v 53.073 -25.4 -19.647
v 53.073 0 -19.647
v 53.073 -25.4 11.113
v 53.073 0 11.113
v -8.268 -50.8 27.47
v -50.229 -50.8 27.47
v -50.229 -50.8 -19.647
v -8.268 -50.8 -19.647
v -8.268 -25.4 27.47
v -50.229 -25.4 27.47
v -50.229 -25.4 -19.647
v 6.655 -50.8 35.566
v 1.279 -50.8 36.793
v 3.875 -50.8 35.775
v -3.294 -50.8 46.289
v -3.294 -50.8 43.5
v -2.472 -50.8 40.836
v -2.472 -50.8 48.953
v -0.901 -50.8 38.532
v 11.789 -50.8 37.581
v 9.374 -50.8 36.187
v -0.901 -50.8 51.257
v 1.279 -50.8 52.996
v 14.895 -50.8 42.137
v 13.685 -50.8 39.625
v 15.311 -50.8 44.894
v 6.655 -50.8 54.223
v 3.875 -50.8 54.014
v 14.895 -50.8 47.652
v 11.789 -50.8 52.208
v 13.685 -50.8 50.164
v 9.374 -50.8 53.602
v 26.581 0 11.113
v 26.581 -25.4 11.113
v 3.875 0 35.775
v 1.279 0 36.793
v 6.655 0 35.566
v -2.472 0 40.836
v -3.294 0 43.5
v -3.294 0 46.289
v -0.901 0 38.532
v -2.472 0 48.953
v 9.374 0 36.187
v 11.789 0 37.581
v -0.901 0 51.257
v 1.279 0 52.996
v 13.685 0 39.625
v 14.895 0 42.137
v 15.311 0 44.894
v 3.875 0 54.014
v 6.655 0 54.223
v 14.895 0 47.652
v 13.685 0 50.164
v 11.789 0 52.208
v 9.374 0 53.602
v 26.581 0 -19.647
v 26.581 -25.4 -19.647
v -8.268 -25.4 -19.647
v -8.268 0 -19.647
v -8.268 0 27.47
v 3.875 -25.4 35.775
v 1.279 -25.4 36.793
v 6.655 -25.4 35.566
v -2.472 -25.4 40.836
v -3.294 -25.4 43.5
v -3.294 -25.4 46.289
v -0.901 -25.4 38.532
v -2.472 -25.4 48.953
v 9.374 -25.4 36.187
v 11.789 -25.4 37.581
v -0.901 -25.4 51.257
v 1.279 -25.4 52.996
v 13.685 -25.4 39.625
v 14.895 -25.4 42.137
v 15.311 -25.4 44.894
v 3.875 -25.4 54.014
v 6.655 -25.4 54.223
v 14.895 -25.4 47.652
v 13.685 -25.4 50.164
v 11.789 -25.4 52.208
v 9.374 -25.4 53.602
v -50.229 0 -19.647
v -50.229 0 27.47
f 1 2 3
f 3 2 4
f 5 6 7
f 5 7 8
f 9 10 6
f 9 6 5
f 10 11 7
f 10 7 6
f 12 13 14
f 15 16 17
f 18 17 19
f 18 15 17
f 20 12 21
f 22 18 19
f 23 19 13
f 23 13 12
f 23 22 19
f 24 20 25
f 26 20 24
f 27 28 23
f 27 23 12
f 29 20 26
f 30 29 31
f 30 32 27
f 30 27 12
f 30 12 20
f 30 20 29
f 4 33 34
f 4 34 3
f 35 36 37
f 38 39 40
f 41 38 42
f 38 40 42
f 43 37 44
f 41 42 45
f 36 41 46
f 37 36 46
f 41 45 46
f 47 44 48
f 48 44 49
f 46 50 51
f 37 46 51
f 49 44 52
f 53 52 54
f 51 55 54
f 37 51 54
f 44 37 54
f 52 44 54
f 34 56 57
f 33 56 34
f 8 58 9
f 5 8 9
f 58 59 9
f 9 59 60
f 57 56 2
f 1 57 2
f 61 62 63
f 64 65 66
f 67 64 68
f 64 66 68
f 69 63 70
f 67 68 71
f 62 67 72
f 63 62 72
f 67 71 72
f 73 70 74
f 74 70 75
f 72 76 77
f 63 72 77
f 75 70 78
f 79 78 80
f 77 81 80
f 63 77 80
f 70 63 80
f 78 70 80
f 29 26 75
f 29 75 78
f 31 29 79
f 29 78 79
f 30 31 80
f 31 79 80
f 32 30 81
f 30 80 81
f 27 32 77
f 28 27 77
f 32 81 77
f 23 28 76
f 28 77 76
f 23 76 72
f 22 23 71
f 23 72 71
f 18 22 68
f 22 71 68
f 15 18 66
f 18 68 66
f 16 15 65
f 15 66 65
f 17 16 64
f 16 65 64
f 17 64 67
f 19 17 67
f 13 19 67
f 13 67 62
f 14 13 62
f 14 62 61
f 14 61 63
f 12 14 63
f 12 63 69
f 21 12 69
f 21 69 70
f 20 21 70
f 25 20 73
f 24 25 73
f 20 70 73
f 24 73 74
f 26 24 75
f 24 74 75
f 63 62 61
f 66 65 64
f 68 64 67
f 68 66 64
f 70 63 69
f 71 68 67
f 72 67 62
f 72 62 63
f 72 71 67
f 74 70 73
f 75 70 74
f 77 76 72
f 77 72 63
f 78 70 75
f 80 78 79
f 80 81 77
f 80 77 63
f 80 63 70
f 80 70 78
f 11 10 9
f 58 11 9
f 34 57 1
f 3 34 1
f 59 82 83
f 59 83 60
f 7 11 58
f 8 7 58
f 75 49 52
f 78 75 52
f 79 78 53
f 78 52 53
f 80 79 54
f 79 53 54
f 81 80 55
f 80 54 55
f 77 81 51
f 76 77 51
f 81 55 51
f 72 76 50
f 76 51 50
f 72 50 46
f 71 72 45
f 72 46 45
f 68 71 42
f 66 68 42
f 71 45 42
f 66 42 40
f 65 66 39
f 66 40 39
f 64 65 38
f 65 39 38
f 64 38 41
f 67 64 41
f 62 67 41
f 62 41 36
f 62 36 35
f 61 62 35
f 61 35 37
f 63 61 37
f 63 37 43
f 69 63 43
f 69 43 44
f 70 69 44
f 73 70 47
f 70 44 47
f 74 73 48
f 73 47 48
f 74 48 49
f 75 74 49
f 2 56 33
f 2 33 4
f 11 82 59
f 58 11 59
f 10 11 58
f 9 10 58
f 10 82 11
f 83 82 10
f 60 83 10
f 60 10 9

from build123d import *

# Parameters (mm, degrees)
F0_W      = 26.492203
F0_H      = 30.759401
F0_W_2    = 41.960802
F0_H_2    = 47.117001
F0_R      = 9.354376
F1_DEPTH  = 25.4
F1_FACE_W = 41.960802
F1_FACE_H = 47.117
F1_FACE_R = 9.354376
F2_DEPTH  = 25.4


with BuildPart() as f1:
    # F0 (on Front) → F1 (new body)
    with BuildSketch(Plane.XZ):
        with Locations((39.8272, -4.267199)):
            Rectangle(F0_W, F0_H)
        with Locations((-29.248102, 3.911601)):
            Rectangle(F0_W_2, F0_H_2)
        with Locations((5.956299, 44.894498)):
            Circle(F0_R)
    extrude(amount=F1_DEPTH)


with BuildPart() as f2:
    # F1_face (on face) → F2 (new body)
    with BuildSketch(Plane(origin=(-29.248102, -25.4, 3.9116), x_dir=(1, 0, 0), z_dir=(0, -1, 0))):
        Rectangle(F1_FACE_W, F1_FACE_H)
        with Locations((35.204401, 40.982897)):
            Circle(F1_FACE_R)
    extrude(amount=F2_DEPTH)


solid = Compound([f1.part, f2.part])
